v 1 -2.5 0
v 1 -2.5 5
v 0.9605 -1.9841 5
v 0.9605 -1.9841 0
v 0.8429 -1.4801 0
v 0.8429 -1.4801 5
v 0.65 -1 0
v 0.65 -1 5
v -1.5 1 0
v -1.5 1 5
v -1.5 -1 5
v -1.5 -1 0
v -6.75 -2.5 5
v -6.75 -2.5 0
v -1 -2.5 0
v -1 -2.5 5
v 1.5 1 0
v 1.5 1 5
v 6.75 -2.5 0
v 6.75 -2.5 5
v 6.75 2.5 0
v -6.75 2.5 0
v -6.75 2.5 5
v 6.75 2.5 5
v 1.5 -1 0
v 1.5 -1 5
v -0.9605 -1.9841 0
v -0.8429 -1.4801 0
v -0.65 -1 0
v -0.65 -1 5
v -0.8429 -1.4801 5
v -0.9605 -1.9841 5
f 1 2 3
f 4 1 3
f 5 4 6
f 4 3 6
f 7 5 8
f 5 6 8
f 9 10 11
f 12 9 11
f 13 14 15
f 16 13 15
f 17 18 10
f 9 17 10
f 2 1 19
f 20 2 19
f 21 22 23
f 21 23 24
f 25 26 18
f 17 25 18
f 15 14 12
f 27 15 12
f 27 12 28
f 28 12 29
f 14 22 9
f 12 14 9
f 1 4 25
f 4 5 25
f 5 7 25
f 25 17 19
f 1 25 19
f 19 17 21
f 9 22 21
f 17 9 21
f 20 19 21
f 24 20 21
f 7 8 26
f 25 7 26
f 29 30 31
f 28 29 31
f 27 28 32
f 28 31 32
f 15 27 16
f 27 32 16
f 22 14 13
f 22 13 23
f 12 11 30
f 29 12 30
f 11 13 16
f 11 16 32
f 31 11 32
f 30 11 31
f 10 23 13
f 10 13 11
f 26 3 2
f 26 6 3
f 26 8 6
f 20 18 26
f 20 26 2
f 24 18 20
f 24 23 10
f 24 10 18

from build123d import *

# Parameters (mm, degrees)
F0_W     = 13.5
F0_H     = 5
F1_DEPTH = 5
F3_DEPTH = 25


with BuildPart() as f1:
    # F0 (on Top) → F1 (new body)
    with BuildSketch(Plane.XY):
        Rectangle(F0_W, F0_H)
    extrude(amount=F1_DEPTH)

    # F2 (on face) → F3 (cut)
    with BuildSketch(Plane.XY.offset(5)):
        Polygon((1.5, -1), (1.5, 1), (-1.5, 1), (-1.5, -1), (-1, -1), (-1, 0.5), (1, 0.5), (1, -1), align=None)
        Polygon((0.65, -1), (1, -1), (1, 0.5), (-1, 0.5), (-1, -1), (-0.65, -1), align=None)
        with BuildLine():
            ThreePointArc((1, -2.5), (0.91134, -1.729854), (0.65, -1))
            Line((0.65, -1), (-0.65, -1))
            ThreePointArc((-0.65, -1), (-0.91134, -1.729854), (-1, -2.5))
            Line((-1, -2.5), (1, -2.5))
        make_face()
    extrude(amount=-F3_DEPTH, mode=Mode.SUBTRACT)


solid = f1.part
